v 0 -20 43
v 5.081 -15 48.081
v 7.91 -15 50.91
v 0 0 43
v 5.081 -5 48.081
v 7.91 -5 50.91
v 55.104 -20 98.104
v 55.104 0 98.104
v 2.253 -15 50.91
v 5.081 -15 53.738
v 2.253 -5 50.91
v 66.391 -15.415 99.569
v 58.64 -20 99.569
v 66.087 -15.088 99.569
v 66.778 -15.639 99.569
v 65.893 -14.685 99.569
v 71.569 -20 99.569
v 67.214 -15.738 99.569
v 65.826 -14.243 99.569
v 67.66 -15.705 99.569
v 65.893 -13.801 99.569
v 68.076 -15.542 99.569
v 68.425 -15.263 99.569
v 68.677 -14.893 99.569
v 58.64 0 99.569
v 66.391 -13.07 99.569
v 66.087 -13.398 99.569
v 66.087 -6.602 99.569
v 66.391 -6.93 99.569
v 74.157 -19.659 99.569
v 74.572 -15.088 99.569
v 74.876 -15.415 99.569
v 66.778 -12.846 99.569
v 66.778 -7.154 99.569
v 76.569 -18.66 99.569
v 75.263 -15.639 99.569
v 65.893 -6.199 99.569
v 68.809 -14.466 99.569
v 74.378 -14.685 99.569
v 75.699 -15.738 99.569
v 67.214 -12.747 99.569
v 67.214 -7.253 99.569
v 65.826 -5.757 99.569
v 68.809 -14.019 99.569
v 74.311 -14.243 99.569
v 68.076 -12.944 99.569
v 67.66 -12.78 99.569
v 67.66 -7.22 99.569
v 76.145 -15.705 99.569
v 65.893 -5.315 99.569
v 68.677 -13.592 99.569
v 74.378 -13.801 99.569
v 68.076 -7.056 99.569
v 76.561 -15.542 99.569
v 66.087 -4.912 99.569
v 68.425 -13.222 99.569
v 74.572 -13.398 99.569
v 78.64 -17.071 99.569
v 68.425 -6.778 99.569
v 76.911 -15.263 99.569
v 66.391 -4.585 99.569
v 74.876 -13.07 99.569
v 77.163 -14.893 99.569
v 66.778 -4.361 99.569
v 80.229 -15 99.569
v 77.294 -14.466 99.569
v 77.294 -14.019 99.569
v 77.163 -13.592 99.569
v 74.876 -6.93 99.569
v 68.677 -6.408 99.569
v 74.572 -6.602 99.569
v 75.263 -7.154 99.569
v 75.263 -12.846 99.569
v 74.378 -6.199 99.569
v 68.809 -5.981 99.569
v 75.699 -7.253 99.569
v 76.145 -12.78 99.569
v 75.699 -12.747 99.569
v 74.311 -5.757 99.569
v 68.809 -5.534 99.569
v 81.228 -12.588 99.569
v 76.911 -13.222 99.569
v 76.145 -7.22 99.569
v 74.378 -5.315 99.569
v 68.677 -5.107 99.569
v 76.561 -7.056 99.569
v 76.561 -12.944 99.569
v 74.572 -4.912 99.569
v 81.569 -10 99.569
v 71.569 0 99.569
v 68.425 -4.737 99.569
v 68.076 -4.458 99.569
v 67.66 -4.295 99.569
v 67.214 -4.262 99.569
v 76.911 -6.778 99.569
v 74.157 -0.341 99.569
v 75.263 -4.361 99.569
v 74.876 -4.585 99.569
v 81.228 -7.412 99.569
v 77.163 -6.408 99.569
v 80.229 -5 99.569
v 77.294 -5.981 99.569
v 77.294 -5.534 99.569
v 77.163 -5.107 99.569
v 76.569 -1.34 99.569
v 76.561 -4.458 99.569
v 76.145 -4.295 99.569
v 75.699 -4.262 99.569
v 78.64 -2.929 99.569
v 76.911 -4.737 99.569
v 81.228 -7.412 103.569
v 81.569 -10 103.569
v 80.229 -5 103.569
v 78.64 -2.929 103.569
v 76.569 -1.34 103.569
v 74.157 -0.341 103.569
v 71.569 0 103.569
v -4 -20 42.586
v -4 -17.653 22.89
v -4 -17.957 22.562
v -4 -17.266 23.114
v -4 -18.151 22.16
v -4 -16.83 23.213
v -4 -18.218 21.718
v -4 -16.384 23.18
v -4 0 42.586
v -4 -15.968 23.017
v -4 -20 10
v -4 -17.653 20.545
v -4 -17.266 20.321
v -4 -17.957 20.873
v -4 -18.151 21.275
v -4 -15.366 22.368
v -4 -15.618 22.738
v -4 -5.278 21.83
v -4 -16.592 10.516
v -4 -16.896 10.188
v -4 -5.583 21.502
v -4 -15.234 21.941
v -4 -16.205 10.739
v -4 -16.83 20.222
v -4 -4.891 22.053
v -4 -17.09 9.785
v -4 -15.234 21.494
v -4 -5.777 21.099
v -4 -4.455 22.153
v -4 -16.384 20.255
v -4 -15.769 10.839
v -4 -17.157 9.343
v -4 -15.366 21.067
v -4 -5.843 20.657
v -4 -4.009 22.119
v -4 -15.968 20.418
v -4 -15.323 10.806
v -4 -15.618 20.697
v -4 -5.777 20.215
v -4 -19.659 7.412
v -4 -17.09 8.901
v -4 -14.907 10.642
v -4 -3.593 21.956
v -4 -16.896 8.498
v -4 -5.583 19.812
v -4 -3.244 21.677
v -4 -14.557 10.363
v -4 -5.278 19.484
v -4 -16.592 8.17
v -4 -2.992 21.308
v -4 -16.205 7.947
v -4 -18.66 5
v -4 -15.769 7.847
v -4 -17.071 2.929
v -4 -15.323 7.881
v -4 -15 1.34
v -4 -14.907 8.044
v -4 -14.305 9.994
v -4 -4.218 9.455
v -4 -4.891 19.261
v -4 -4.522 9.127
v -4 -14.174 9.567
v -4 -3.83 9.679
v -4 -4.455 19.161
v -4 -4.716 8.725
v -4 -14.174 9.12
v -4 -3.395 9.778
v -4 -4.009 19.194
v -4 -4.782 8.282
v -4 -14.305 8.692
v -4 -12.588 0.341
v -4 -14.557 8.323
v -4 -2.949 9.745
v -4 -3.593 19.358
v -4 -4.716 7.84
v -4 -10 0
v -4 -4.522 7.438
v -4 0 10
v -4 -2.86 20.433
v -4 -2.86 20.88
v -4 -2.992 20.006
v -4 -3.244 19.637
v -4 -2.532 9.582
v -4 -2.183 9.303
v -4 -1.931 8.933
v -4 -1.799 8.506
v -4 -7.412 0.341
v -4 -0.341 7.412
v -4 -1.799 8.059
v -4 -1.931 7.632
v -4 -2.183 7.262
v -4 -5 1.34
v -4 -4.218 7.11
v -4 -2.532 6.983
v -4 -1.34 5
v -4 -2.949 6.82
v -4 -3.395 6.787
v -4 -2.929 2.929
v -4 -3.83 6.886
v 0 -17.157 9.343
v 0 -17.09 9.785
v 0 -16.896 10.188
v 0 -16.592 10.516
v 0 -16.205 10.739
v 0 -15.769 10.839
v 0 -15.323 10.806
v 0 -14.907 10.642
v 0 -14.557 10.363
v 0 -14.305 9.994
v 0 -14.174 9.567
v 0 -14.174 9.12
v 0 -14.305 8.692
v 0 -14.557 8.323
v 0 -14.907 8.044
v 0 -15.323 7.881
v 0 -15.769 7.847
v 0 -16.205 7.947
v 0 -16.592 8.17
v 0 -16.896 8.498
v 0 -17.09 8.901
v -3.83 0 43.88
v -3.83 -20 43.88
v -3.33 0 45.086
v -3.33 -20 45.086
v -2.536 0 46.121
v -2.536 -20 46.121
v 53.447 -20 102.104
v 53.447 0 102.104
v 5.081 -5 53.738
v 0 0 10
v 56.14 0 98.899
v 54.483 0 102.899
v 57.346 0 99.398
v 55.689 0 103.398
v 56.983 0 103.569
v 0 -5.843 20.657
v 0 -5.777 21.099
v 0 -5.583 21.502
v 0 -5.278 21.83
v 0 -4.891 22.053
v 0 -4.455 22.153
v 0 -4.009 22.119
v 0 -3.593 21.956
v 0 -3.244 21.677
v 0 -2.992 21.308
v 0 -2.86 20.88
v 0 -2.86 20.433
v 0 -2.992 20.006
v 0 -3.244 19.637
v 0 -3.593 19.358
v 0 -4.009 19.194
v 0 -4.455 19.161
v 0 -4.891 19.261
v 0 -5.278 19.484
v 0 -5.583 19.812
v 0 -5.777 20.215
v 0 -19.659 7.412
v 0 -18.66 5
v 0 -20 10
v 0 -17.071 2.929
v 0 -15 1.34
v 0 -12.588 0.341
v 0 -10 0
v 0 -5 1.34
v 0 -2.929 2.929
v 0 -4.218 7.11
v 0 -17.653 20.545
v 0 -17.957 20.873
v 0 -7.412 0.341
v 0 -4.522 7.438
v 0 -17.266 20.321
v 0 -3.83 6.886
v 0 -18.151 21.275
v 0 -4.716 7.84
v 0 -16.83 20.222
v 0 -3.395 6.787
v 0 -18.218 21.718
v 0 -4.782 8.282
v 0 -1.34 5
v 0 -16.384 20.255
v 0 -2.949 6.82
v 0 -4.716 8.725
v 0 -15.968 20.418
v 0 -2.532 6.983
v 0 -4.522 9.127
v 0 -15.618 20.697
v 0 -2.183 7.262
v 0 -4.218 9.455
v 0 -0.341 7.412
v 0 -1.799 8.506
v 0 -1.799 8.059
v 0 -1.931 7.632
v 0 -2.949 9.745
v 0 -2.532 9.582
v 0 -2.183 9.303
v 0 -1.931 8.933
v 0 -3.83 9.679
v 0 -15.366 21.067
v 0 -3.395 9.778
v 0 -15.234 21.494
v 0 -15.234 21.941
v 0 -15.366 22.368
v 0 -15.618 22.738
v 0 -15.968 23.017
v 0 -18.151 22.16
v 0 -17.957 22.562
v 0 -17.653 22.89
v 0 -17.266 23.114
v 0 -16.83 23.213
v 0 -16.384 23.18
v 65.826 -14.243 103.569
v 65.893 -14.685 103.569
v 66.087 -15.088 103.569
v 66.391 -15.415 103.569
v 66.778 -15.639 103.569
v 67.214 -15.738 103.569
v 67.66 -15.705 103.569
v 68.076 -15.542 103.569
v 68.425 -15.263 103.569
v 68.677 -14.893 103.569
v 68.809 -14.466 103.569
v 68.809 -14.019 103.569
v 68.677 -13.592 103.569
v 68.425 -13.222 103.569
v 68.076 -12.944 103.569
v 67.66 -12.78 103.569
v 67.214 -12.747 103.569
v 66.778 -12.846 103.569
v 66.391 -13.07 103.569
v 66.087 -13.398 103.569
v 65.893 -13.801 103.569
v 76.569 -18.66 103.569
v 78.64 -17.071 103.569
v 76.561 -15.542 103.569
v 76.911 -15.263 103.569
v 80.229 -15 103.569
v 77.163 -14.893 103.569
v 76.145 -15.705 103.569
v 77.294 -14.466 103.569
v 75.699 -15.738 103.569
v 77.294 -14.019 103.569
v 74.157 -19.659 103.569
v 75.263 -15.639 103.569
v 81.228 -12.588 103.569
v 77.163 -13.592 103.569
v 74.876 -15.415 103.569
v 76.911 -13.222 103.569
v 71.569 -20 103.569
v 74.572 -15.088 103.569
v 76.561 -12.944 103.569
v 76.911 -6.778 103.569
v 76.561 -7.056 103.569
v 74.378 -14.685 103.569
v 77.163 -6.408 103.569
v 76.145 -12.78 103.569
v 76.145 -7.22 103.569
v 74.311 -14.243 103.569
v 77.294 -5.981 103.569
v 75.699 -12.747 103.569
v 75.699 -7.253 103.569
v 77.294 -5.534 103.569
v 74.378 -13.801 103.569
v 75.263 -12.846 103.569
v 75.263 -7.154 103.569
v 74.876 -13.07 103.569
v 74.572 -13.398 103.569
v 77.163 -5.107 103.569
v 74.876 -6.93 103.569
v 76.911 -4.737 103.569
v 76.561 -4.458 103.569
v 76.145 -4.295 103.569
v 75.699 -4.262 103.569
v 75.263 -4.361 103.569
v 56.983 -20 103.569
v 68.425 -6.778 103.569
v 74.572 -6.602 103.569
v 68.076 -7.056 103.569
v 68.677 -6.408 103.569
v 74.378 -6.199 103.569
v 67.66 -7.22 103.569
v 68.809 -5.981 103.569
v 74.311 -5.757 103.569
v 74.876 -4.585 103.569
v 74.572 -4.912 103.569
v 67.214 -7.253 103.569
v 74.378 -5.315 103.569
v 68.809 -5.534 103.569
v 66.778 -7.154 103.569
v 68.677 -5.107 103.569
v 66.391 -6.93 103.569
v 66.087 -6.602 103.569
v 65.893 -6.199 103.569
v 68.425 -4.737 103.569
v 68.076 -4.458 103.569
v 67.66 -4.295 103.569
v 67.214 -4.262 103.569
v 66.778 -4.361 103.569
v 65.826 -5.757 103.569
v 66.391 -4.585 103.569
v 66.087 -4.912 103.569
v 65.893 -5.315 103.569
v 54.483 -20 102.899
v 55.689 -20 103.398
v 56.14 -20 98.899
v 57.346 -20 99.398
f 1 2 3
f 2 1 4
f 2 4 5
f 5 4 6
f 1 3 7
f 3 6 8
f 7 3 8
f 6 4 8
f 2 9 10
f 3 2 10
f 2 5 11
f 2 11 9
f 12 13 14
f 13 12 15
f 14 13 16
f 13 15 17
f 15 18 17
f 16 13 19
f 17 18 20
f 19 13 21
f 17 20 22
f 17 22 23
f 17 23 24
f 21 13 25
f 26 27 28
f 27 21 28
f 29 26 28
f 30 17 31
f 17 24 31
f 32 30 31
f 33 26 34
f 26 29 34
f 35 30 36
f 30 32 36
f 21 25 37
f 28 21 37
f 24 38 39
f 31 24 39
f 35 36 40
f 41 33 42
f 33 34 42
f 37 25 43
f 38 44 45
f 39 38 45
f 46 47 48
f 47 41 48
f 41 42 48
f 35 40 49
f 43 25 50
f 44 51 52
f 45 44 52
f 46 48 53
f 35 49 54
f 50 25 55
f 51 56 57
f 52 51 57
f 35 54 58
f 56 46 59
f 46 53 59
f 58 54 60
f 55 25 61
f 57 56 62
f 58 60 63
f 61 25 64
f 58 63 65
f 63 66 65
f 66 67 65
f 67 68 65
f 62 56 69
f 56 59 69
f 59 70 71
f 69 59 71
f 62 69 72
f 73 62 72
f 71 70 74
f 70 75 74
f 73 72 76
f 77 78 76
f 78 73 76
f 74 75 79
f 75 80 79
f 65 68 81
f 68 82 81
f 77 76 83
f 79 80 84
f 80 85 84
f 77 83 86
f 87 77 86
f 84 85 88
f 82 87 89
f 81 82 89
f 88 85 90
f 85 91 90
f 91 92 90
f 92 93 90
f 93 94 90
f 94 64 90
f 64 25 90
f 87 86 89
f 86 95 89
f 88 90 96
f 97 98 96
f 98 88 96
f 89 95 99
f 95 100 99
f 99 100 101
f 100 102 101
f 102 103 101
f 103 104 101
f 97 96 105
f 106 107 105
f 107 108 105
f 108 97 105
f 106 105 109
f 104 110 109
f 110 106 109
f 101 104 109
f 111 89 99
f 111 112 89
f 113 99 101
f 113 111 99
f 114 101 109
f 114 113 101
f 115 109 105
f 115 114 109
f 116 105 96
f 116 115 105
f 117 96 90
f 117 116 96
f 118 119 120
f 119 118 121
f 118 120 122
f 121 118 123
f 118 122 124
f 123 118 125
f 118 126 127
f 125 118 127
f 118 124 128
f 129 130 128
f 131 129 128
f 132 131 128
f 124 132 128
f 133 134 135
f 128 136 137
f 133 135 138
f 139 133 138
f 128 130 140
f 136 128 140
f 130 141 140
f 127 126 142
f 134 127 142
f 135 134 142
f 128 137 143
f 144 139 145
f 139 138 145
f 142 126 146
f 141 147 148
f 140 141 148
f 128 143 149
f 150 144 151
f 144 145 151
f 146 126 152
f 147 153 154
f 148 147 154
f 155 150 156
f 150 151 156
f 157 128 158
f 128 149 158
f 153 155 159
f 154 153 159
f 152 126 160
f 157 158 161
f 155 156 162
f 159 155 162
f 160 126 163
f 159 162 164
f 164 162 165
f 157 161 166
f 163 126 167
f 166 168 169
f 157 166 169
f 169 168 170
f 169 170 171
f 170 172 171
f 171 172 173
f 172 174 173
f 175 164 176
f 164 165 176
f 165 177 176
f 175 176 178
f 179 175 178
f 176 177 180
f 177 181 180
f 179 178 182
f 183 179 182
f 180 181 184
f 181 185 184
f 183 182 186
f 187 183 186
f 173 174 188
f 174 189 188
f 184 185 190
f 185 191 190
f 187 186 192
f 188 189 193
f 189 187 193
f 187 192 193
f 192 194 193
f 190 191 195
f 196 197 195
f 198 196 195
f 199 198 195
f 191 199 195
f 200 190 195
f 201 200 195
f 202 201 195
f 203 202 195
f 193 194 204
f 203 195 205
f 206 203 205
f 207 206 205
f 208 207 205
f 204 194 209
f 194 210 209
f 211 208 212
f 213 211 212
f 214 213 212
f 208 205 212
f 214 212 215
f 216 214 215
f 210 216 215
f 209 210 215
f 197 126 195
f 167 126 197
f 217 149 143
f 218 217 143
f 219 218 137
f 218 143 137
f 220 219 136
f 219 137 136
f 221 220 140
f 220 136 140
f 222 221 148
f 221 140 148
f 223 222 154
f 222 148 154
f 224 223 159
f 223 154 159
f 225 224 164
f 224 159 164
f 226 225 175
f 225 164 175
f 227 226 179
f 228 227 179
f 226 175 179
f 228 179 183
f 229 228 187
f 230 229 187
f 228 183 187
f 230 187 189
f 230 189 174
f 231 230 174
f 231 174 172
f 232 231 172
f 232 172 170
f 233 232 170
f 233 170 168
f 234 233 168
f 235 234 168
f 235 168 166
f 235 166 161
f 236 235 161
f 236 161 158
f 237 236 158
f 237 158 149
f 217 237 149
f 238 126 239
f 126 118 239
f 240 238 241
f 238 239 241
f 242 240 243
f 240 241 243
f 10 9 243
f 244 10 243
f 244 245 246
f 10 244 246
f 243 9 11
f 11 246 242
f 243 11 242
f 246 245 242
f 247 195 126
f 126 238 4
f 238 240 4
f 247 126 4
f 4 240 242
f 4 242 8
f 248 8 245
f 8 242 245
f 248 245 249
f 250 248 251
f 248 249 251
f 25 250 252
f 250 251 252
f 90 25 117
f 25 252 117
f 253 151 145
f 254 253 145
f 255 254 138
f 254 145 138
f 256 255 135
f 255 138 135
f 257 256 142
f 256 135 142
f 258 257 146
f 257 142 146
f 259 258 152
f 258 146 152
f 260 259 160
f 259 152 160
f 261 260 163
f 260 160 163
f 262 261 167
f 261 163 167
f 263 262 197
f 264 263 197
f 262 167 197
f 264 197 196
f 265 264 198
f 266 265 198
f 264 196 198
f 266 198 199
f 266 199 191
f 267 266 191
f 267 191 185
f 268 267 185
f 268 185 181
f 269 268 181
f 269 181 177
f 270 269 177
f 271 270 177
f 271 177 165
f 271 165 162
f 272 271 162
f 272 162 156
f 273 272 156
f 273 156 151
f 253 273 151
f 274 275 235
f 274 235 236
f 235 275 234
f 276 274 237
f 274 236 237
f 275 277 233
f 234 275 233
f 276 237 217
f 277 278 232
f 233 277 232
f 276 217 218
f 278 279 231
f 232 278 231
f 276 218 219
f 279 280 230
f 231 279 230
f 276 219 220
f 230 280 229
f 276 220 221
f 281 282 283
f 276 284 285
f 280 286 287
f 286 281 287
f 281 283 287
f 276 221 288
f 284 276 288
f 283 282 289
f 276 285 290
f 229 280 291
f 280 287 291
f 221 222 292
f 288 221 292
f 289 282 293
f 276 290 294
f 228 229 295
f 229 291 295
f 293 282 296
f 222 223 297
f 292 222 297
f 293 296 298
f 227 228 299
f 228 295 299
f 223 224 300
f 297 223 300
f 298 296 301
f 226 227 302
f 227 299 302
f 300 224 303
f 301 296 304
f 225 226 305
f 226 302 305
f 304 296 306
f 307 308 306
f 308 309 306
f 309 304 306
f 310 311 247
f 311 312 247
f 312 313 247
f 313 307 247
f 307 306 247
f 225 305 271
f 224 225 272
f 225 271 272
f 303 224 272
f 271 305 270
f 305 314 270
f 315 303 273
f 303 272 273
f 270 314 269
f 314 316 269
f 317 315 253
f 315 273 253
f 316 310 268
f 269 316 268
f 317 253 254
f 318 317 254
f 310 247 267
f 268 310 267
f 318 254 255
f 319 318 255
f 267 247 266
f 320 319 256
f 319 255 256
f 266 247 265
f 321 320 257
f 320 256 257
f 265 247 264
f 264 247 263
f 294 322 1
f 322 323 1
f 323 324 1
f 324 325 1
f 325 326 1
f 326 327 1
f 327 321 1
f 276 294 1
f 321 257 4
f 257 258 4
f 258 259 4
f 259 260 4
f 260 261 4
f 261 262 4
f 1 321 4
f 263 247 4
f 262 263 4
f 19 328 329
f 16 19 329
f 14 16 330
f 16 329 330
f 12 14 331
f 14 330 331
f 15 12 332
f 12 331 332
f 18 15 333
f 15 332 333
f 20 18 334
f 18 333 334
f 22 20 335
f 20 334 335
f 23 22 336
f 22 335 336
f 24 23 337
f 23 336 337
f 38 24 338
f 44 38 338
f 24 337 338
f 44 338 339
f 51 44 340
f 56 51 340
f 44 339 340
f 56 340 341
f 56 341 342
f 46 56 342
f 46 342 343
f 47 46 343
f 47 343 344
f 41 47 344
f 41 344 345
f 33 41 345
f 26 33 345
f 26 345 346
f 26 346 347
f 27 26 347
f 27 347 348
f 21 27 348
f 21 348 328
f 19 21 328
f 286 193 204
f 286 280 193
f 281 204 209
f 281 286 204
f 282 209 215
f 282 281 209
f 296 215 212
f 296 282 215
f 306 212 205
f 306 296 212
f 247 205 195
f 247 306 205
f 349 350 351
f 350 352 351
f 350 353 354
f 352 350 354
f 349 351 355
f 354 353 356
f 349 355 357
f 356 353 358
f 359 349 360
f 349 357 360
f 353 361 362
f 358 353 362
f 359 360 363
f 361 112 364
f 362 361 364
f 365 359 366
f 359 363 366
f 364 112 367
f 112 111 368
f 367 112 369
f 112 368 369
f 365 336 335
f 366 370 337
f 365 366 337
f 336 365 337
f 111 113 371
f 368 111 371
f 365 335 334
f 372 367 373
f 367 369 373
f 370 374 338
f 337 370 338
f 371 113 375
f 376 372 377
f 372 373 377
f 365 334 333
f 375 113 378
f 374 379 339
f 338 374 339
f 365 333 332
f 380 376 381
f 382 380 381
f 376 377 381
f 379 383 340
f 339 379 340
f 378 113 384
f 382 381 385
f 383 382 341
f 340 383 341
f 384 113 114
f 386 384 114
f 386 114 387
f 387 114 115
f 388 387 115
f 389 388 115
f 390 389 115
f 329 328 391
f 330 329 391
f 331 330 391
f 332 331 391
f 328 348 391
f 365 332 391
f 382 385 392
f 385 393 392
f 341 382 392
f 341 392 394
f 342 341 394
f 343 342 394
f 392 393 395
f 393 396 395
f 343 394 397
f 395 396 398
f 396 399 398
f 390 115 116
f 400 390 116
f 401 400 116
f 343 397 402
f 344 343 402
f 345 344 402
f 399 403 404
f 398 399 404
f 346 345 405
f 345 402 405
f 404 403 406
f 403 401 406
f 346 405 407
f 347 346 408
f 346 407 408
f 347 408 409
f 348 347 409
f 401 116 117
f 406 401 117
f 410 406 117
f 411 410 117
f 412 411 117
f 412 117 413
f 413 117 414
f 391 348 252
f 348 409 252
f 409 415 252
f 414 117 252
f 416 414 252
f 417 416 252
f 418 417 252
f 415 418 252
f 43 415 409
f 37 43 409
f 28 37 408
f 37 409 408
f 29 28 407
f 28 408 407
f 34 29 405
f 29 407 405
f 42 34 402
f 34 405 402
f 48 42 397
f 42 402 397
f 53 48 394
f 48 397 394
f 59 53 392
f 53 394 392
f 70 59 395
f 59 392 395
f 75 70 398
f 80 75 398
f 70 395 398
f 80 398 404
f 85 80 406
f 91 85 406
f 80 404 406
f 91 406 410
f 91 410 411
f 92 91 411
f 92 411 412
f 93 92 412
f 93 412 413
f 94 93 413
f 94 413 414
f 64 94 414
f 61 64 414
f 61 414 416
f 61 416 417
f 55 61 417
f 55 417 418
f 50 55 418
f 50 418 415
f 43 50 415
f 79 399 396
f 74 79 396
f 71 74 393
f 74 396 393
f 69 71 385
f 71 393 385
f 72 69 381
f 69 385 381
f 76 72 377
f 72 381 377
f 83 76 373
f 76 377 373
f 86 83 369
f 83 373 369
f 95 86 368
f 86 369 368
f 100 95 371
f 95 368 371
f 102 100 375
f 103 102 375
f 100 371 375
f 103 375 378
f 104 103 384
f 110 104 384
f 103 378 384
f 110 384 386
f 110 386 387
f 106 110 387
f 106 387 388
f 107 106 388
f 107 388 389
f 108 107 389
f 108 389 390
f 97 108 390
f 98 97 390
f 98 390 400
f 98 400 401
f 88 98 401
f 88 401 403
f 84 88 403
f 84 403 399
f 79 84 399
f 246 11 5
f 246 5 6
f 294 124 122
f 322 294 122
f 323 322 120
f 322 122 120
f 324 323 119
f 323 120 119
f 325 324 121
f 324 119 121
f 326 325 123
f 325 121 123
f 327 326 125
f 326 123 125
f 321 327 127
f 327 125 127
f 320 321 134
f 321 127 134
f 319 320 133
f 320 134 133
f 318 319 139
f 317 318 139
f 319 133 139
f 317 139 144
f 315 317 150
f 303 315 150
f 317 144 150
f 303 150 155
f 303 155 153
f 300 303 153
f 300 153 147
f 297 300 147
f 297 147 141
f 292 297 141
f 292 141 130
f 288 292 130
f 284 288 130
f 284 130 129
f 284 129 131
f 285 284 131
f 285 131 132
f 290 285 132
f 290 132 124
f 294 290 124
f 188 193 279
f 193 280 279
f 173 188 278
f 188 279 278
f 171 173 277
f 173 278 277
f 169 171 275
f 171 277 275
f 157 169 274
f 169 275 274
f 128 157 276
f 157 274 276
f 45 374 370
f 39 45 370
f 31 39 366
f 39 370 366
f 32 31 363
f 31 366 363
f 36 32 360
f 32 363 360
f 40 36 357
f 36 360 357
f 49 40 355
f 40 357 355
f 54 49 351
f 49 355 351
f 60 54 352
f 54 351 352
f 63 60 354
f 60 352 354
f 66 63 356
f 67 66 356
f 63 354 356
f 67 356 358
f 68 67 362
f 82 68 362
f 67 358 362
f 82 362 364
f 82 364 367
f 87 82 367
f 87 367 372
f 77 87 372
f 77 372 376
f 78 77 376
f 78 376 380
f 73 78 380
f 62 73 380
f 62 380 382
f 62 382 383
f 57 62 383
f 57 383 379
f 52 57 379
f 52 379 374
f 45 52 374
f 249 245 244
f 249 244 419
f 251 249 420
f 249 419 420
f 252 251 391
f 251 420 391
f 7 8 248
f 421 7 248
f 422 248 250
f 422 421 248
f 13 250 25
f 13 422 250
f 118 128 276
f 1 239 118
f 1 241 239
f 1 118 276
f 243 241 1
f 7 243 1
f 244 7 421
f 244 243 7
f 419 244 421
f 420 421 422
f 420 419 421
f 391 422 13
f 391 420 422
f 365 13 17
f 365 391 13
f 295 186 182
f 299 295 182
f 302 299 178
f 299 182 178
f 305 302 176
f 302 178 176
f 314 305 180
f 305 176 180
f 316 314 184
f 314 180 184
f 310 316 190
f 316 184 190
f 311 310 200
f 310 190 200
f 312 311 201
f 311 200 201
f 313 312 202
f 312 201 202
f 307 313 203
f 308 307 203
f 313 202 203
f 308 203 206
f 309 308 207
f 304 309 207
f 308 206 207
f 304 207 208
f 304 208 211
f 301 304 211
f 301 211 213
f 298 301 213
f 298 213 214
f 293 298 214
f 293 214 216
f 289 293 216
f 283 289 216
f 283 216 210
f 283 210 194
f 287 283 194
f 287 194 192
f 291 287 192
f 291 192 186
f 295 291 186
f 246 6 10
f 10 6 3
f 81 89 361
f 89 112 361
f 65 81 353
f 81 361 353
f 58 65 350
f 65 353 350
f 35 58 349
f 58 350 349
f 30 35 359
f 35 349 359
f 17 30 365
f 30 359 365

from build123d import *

# Parameters (mm, degrees)
F1_DEPTH = 20
F3_R     = 9.99999
F4_D     = 3
F5_R     = 5
F7_D     = 3
F8_W     = 4
F8_H     = 10
F9_DEPTH = 25


# Not quite as in the source:
# - a fillet or chamfer is up to 0.001 mm smaller than in the source, because OpenCascade refuses the exact size


with BuildPart() as f1:
    # F0 (on Front) → F1 (new body)
    with BuildSketch(Plane.XZ):
        Polygon((-4, 0), (0, 0), (0, 43), (56.5685424949, 99.5685424949), (81.5685424949, 99.5685424949), (81.5685424949, 103.5685424949), (54.9116882454, 103.5685424949), (-4, 44.6568542495), align=None)
    extrude(amount=F1_DEPTH)

    # F3 (radius 10 in the source; OpenCascade refuses exactly that, so slightly less here)
    f3_edges = [f1.edges().sort_by_distance(p)[0] for p in [
        (-2, -20, 0),
        (-2, 0, 0),
        (81.568542, 0, 101.568542),
        (81.568542, -20, 101.568542),
    ]]
    fillet(f3_edges, radius=F3_R)

    # F4 (through all)
    with Locations(Plane(origin=(0, 0, 99.5685424949), x_dir=(1, 0, 0), z_dir=(0, 0, -1))):
        with Locations((75.811183182, 14.2426406871), (67.3259018078, 14.2426406871), (67.3259018078, 5.7573593129), (75.811183182, 5.7573593129)):
            Hole(F4_D / 2)

    # F5
    f5_edges = [f1.edges().sort_by_distance(p)[0] for p in [
        (54.911688, -10, 103.568542),
        (56.568542, -10, 99.568542),
        (-4, -10, 44.656854),
    ]]
    fillet(f5_edges, radius=F5_R)

    # F7 (through all)
    with Locations(Plane.YZ):
        with Locations((-4.3431457505, 20.6568542495), (-16.7175144213, 21.7175144213), (-15.6568542495, 9.3431457505), (-3.2824855787, 8.2824855787)):
            Hole(F7_D / 2)

    # F8 (on face) → F9 (cut)
    with BuildSketch(Plane(origin=(-21.5, 0, 21.5), x_dir=(0.7071067812, 0, 0.7071067812), z_dir=(0.7071067812, 0, -0.7071067812))):
        with Locations((39.5918783247, 10)):
            Rectangle(F8_W, F8_H)
    extrude(amount=-F9_DEPTH, mode=Mode.SUBTRACT)


solid = f1.part
